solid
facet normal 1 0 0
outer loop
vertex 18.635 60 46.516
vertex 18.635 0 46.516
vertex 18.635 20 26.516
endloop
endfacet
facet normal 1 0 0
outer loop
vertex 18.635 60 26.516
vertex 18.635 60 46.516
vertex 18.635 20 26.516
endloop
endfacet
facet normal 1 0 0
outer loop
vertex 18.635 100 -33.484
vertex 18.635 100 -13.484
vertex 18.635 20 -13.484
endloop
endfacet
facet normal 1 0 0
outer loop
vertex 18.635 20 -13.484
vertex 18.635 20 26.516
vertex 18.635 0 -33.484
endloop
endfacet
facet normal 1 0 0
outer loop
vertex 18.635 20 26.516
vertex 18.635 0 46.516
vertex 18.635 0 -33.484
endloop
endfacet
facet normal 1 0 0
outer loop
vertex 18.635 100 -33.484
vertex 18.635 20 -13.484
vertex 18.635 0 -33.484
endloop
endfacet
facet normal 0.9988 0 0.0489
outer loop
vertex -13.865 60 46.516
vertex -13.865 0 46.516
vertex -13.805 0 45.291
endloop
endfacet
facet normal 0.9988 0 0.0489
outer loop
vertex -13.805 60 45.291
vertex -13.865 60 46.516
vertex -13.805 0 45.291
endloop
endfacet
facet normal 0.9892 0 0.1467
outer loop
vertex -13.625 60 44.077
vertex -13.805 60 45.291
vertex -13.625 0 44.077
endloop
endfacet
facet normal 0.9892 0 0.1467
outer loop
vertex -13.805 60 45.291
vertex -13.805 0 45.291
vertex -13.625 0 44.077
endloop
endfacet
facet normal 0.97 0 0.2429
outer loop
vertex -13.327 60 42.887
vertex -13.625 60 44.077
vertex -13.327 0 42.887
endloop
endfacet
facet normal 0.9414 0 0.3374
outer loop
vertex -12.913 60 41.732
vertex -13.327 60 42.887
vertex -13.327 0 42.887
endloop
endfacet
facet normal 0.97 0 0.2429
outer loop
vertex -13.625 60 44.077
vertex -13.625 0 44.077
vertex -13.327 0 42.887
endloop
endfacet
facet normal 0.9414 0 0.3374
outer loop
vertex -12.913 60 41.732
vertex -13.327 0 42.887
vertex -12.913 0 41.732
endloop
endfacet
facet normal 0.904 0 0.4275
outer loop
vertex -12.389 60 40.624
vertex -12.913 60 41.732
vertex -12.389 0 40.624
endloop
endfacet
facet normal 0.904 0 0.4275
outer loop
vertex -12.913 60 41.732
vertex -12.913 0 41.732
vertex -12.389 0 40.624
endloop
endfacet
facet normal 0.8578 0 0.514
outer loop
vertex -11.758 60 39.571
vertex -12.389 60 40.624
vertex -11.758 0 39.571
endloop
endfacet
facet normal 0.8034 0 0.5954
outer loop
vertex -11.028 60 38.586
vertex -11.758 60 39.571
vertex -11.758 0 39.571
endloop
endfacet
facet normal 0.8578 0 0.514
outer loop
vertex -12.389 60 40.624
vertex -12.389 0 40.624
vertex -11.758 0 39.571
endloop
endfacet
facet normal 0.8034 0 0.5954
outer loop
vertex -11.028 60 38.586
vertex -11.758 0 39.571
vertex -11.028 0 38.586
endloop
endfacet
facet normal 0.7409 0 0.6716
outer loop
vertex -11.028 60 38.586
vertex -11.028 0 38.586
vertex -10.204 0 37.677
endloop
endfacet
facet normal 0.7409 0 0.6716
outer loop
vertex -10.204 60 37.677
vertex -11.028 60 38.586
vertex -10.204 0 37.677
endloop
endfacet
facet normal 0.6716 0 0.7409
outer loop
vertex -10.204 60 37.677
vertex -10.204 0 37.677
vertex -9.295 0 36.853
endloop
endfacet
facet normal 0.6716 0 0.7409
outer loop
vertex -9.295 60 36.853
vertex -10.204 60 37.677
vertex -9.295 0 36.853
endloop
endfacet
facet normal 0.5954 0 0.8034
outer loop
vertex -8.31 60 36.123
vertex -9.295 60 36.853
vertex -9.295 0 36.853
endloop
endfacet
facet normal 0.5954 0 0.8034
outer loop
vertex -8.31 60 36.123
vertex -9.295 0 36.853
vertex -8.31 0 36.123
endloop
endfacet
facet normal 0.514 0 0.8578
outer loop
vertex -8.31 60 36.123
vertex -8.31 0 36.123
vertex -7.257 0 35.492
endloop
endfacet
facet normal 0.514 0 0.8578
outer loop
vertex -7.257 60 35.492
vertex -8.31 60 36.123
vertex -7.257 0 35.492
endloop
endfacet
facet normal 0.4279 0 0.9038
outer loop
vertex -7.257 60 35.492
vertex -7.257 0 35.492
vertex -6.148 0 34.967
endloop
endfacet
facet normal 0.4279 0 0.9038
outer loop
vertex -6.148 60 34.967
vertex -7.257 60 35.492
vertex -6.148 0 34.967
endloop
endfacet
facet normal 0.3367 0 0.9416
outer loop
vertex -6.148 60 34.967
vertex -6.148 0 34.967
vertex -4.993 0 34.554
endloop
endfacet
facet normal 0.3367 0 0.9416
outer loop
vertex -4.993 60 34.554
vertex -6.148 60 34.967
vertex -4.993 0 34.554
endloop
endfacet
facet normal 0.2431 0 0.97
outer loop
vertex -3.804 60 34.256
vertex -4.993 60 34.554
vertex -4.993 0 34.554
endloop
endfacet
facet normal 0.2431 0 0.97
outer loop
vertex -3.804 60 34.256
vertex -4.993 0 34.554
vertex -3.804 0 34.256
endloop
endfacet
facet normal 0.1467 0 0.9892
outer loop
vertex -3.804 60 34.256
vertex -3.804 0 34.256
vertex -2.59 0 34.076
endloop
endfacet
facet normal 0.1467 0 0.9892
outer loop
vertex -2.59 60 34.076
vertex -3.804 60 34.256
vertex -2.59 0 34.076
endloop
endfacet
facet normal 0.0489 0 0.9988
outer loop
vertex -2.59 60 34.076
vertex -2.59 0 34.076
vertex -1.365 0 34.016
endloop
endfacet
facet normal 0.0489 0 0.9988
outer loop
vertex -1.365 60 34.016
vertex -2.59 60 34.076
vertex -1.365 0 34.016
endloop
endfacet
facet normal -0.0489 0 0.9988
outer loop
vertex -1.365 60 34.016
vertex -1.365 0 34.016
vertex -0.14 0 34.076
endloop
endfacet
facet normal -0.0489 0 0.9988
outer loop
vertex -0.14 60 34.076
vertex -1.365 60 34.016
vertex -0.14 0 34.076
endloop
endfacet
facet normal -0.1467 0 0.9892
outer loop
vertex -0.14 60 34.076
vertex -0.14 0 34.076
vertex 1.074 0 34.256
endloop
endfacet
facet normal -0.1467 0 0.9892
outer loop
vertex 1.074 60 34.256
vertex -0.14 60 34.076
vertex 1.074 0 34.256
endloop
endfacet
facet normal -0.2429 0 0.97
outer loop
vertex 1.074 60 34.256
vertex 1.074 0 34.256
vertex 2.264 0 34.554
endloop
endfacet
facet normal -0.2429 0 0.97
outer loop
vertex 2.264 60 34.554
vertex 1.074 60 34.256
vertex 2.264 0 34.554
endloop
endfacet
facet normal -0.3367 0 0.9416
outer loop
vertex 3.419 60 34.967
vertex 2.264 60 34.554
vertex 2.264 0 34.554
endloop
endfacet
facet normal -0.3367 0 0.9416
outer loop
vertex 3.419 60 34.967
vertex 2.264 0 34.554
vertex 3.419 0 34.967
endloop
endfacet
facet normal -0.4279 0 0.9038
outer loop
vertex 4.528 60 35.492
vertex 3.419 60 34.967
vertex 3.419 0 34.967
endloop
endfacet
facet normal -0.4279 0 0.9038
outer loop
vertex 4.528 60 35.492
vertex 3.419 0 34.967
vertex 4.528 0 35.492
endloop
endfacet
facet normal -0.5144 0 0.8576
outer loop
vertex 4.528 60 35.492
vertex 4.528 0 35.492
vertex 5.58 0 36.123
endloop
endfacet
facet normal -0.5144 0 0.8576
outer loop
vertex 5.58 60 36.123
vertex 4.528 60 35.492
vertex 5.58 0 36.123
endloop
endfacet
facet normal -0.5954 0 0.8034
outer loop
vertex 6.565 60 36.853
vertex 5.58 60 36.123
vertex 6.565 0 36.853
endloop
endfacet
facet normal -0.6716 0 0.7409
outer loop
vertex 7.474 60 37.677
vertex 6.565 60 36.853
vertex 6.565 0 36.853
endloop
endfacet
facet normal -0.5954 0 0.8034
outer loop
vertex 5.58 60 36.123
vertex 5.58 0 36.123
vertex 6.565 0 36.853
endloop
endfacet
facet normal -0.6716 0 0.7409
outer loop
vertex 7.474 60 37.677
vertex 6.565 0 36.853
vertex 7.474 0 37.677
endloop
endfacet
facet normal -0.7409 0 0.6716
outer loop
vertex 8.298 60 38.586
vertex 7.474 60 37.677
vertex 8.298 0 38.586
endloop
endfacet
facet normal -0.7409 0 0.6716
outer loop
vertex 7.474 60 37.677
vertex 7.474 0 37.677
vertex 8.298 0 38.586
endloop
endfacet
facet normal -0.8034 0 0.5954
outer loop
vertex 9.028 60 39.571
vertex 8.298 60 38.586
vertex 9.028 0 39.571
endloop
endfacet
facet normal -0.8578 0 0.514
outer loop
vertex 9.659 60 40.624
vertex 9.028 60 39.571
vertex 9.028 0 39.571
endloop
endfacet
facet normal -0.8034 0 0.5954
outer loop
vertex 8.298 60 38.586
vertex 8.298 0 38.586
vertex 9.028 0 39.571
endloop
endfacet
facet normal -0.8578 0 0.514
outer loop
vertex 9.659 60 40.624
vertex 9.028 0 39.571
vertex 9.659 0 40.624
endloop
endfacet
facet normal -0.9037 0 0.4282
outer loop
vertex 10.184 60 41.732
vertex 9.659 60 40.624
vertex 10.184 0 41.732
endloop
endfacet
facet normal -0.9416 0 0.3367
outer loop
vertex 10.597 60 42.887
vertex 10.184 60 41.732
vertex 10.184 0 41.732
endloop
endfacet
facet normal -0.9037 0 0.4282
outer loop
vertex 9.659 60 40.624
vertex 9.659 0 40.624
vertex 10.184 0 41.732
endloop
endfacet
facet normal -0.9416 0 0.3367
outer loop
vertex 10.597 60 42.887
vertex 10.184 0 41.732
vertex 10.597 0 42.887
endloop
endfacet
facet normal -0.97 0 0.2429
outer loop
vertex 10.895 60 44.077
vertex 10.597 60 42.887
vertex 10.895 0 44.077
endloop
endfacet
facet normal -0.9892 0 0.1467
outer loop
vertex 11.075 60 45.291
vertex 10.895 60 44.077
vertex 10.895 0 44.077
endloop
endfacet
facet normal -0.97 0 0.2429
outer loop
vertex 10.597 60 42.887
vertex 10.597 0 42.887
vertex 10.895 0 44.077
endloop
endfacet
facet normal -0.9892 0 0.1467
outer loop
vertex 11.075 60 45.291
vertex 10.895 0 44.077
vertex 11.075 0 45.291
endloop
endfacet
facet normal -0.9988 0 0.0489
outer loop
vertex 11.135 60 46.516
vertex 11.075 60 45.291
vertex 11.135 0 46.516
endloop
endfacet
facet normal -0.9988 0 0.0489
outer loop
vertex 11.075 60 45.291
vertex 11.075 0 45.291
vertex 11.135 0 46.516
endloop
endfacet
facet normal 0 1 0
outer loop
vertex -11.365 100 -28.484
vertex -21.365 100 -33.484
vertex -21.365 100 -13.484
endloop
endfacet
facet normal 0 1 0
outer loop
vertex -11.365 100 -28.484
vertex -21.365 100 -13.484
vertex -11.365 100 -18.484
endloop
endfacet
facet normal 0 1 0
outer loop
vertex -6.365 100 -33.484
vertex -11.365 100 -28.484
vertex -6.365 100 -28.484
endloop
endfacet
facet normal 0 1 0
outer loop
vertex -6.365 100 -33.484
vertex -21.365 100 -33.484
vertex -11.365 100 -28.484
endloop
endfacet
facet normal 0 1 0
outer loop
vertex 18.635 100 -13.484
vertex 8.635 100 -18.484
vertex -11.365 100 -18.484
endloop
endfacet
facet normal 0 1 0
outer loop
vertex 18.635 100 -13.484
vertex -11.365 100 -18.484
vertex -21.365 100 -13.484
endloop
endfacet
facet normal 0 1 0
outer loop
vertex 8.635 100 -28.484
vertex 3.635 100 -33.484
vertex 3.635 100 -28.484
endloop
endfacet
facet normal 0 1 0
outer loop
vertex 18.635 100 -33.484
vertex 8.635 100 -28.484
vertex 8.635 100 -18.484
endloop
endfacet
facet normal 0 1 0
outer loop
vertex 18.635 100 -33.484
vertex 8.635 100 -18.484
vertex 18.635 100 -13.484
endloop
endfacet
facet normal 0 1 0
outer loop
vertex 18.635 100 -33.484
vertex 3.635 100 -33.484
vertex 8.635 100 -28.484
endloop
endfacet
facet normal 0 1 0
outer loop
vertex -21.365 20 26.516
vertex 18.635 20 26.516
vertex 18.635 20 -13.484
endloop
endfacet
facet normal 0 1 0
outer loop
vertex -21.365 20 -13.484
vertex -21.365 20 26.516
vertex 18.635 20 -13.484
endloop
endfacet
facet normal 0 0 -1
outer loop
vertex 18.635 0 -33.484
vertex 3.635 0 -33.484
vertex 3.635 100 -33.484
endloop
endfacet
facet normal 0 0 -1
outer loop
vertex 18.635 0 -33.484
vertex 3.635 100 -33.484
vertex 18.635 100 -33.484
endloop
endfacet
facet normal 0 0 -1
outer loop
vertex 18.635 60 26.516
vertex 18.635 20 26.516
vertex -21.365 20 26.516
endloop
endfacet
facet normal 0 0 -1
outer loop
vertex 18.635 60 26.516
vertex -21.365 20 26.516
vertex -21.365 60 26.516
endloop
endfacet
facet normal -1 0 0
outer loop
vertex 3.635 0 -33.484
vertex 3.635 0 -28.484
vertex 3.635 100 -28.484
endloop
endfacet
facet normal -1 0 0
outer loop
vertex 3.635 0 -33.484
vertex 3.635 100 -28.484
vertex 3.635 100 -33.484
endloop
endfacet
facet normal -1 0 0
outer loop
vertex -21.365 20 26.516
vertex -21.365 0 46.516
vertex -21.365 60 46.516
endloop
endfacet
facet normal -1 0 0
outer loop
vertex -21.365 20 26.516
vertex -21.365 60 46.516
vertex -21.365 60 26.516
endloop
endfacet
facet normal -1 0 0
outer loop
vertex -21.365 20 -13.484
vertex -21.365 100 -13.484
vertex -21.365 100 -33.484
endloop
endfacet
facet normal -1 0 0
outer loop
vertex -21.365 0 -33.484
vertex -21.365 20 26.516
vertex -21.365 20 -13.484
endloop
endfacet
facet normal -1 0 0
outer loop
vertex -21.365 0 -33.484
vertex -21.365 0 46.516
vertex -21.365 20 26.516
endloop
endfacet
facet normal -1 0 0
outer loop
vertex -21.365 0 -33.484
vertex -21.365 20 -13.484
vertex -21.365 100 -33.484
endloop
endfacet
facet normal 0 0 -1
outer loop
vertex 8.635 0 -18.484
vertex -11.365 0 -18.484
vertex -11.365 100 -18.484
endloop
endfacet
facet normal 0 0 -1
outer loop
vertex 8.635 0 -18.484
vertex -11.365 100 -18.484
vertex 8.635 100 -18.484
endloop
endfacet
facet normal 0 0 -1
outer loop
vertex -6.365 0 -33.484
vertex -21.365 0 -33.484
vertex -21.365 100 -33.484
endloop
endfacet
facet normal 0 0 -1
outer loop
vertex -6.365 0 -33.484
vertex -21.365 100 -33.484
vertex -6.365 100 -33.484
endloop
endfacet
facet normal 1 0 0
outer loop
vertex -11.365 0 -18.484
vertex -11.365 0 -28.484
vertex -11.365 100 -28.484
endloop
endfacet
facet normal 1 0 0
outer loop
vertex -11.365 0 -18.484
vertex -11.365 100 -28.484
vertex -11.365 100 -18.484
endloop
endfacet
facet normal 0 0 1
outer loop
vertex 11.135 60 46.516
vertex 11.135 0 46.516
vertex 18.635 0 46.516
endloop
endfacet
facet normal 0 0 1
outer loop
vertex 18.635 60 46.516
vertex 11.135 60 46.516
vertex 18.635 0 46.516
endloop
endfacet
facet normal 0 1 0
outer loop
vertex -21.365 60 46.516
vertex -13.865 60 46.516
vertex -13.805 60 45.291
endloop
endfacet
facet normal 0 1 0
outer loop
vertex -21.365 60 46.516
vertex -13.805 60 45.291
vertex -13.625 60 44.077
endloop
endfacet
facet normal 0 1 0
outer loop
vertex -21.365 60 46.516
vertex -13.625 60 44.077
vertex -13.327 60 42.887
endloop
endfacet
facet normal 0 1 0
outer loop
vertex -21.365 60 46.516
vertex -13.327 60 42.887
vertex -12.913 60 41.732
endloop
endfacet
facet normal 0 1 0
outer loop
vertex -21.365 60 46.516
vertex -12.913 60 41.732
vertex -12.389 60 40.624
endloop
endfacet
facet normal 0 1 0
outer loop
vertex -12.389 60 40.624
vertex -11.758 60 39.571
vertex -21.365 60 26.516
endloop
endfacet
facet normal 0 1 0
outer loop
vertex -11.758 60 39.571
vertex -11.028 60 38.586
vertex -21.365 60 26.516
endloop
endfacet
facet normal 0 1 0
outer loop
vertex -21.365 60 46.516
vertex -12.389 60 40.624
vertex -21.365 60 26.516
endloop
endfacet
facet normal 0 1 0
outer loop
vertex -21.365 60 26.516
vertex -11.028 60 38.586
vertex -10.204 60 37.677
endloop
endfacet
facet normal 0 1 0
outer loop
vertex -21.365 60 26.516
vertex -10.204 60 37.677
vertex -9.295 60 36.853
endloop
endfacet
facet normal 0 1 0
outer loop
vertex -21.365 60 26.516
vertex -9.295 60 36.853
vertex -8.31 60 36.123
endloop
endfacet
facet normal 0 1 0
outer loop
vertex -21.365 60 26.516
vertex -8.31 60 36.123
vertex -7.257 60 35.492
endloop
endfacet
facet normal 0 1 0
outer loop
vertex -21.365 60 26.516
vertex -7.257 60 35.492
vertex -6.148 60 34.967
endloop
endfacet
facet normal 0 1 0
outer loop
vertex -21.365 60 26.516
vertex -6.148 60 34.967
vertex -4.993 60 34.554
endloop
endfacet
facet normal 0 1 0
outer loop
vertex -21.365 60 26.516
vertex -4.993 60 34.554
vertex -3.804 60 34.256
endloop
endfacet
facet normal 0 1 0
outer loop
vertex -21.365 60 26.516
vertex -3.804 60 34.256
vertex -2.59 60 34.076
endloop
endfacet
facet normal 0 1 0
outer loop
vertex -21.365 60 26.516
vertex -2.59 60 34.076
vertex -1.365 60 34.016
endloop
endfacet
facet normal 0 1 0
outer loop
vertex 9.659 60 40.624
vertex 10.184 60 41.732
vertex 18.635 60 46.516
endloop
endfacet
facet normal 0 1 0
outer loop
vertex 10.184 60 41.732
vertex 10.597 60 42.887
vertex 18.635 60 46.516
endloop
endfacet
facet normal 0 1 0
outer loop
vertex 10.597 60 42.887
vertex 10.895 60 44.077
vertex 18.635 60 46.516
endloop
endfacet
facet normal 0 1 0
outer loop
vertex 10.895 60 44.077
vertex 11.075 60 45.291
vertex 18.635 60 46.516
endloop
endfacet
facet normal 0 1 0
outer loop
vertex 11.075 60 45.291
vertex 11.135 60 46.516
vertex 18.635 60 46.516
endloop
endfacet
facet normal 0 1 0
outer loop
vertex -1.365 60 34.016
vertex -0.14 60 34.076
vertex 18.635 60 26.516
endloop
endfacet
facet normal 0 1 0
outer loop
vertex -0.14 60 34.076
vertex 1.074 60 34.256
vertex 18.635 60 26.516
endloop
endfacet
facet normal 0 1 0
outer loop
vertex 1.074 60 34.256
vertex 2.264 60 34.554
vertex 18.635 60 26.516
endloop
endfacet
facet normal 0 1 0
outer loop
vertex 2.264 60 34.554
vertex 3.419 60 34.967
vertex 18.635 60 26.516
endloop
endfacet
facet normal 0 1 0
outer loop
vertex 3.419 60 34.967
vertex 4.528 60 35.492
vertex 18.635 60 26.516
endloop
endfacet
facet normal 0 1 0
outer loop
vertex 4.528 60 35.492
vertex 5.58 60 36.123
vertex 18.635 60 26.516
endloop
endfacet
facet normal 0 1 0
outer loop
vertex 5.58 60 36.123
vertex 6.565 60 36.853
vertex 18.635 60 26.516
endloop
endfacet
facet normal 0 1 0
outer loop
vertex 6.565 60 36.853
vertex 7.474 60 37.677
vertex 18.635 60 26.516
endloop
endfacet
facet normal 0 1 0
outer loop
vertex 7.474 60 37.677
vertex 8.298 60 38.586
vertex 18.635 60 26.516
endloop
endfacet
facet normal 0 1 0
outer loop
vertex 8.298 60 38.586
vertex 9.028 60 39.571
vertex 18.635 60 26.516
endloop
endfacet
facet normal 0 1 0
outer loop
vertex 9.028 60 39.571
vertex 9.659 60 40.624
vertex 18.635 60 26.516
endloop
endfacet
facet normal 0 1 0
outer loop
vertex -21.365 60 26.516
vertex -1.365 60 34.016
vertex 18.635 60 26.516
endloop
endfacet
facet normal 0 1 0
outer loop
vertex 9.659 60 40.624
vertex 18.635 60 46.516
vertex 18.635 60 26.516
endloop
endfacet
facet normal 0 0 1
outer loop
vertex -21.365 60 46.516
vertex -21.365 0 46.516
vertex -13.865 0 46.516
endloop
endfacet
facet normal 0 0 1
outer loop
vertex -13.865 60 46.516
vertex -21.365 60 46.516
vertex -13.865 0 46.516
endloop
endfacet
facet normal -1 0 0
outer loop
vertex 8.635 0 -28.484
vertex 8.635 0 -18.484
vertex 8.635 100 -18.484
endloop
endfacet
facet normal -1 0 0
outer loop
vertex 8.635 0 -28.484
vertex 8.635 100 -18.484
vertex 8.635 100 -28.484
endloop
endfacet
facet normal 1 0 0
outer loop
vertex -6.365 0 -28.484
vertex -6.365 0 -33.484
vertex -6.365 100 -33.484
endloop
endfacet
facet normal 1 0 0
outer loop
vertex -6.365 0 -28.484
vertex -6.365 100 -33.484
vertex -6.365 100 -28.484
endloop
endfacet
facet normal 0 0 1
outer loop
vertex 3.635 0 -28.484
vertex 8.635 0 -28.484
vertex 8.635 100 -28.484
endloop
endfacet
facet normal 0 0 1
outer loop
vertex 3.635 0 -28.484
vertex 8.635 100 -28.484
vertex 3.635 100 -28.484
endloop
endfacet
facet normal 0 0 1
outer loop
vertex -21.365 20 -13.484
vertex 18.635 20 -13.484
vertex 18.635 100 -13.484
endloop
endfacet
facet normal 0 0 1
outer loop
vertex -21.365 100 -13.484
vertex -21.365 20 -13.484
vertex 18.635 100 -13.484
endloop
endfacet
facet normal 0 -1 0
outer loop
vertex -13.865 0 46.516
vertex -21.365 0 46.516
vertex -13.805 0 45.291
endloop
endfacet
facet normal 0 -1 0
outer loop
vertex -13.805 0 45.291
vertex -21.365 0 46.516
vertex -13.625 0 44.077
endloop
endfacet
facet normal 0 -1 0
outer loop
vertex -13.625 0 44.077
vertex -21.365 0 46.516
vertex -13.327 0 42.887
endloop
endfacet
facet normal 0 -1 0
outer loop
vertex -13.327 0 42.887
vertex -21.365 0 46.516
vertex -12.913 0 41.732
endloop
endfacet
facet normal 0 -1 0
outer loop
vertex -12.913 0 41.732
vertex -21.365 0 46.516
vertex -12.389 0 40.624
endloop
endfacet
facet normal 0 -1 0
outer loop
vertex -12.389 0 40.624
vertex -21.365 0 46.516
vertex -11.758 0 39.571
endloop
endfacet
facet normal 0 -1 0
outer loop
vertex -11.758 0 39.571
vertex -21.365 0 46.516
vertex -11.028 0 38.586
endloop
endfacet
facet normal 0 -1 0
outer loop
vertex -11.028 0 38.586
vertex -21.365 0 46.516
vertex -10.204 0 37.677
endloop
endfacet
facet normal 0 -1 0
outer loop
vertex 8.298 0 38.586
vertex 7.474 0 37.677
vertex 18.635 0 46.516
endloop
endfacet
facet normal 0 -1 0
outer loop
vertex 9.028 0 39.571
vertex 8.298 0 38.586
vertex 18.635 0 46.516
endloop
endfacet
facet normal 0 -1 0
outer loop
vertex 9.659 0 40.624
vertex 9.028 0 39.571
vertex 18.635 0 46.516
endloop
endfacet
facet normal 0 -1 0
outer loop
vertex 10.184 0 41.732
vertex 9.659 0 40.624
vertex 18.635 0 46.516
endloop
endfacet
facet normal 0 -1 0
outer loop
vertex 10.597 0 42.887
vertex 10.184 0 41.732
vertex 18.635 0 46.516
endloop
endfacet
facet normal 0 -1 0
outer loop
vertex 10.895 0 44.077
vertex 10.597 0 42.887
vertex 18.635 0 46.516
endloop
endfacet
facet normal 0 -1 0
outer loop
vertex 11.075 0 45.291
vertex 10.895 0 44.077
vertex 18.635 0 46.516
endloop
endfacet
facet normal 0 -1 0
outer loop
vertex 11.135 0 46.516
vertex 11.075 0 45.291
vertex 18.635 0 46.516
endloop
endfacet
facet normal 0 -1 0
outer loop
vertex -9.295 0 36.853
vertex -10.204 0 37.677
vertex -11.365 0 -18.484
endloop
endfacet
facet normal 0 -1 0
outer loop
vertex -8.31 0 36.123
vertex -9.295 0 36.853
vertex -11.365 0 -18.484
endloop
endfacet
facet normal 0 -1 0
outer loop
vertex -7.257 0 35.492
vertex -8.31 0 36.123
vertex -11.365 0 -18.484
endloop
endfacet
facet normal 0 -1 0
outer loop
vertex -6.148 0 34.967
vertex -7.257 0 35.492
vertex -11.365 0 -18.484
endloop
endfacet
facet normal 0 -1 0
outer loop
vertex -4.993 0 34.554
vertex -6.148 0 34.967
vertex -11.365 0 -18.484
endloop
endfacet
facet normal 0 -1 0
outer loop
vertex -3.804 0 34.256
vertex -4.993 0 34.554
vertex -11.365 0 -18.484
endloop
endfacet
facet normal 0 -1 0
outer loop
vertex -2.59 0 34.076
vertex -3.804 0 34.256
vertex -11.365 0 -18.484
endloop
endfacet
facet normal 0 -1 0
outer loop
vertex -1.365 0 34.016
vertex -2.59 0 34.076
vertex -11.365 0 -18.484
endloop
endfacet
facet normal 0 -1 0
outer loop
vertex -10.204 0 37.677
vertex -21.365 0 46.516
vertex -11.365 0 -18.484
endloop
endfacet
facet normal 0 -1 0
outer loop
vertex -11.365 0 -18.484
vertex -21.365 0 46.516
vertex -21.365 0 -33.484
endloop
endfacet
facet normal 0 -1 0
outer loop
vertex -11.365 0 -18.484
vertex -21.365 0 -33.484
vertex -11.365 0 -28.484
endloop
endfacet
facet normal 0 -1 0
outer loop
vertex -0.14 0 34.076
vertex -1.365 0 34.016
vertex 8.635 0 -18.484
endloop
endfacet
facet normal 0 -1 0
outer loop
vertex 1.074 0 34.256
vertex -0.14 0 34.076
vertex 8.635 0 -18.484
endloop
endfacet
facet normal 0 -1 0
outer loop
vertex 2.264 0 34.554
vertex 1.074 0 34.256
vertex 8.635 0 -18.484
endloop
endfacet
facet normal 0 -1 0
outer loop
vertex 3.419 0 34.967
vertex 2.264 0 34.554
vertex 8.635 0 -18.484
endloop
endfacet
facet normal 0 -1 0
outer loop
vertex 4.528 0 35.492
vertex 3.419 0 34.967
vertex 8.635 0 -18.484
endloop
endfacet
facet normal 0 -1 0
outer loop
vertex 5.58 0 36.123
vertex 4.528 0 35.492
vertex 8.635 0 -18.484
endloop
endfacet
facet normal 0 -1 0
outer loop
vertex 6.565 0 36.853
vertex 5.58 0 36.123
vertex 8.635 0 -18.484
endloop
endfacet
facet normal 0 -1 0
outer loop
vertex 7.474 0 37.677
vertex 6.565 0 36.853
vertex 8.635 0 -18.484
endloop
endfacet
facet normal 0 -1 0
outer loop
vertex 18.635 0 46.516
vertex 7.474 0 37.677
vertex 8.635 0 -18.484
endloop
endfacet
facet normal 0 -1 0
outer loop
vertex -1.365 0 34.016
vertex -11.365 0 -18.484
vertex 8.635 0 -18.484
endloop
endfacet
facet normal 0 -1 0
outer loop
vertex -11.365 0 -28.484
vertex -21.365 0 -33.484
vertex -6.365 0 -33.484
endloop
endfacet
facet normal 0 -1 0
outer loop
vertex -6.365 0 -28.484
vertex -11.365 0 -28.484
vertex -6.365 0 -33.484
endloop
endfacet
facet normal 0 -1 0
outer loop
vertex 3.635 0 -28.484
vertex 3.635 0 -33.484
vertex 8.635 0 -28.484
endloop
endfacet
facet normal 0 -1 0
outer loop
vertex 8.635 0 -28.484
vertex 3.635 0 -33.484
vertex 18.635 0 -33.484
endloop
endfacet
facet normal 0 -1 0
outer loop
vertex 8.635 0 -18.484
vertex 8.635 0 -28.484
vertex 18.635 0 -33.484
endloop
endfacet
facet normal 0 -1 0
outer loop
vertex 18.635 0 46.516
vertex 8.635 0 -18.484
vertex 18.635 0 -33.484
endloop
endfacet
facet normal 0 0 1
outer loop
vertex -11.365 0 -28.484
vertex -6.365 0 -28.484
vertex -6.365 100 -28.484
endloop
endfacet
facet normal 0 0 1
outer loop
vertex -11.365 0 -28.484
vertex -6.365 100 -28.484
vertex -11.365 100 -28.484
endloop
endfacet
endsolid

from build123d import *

# Parameters (mm, degrees)
SKETCH1_W           = 40
SKETCH1_H           = 80
BOSS_EXTRUDE1_DEPTH = 100
CUT_EXTRUDE1_REACH  = 119.319
SKETCH3_W           = 40
SKETCH3_H           = 80
CUT_EXTRUDE2_REACH  = 119.319
SKETCH5_W           = 20
SKETCH5_H           = 40
CUT_EXTRUDE3_REACH  = 114.34
SKETCH6_R           = 12.5
CUT_EXTRUDE5_REACH  = 114.34


with BuildPart() as part:
    # Sketch1 → Boss-Extrude1 (new body)
    with BuildSketch(Plane(origin=(0, 0, 0), x_dir=(1, 0, 0), z_dir=(0, 1, 0))):
        with Locations((-1.364903769, -6.515993016)):
            Rectangle(SKETCH1_W, SKETCH1_H)
    extrude(amount=BOSS_EXTRUDE1_DEPTH)

    # Sketch3 → Cut-Extrude1 (cut, up to next)
    with BuildSketch(Plane(origin=(18.635096231, 0, 0), x_dir=(0, 0, -1), z_dir=(1, 0, 0)), mode=Mode.PRIVATE) as cut_extrude1_sk1:
        with Locations((-6.515993016, 60)):
            Rectangle(SKETCH3_W, SKETCH3_H)
    cut_extrude1_tool1 = extrude(cut_extrude1_sk1.sketch, amount=-CUT_EXTRUDE1_REACH, mode=Mode.PRIVATE) & part.part
    add(cut_extrude1_tool1.solids().sort_by_distance((18.635096, 60, 6.515993))[0], mode=Mode.SUBTRACT)

    # Sketch5 → Cut-Extrude2 (cut, up to next)
    with BuildSketch(Plane(origin=(18.635096231, 0, 0), x_dir=(0, 0, -1), z_dir=(1, 0, 0)), mode=Mode.PRIVATE) as cut_extrude2_sk1:
        with Locations((-36.515993016, 80)):
            Rectangle(SKETCH5_W, SKETCH5_H)
    cut_extrude2_tool1 = extrude(cut_extrude2_sk1.sketch, amount=-CUT_EXTRUDE2_REACH, mode=Mode.PRIVATE) & part.part
    add(cut_extrude2_tool1.solids().sort_by_distance((18.635096, 80, 36.515993))[0], mode=Mode.SUBTRACT)

    # Sketch6 → Cut-Extrude3 (cut, up to next)
    with BuildSketch(Plane.XZ, mode=Mode.PRIVATE) as cut_extrude3_sk1:
        with Locations((-1.364903769, 46.515993016)):
            Circle(SKETCH6_R)
    cut_extrude3_tool1 = extrude(cut_extrude3_sk1.sketch, amount=-CUT_EXTRUDE3_REACH, mode=Mode.PRIVATE) & part.part
    add(cut_extrude3_tool1.solids().sort_by_distance((-1.364904, 0, 46.515993))[0], mode=Mode.SUBTRACT)

    # Sketch10 → Cut-Extrude5 (cut, up to next)
    with BuildSketch(Plane.XZ, mode=Mode.PRIVATE) as cut_extrude5_sk1:
        Polygon((-11.364903769, -18.484006984), (8.635096231, -18.484006984), (8.635096231, -28.484006984), (3.635096231, -28.484006984), (3.635096231, -33.484006984), (-6.364903769, -33.484006984), (-6.364903769, -28.484006984), (-11.364903769, -28.484006984), align=None)
    cut_extrude5_tool1 = extrude(cut_extrude5_sk1.sketch, amount=-CUT_EXTRUDE5_REACH, mode=Mode.PRIVATE) & part.part
    add(cut_extrude5_tool1.solids().sort_by_distance((-1.364904, 0, -24.984007))[0], mode=Mode.SUBTRACT)


solid = part.part
